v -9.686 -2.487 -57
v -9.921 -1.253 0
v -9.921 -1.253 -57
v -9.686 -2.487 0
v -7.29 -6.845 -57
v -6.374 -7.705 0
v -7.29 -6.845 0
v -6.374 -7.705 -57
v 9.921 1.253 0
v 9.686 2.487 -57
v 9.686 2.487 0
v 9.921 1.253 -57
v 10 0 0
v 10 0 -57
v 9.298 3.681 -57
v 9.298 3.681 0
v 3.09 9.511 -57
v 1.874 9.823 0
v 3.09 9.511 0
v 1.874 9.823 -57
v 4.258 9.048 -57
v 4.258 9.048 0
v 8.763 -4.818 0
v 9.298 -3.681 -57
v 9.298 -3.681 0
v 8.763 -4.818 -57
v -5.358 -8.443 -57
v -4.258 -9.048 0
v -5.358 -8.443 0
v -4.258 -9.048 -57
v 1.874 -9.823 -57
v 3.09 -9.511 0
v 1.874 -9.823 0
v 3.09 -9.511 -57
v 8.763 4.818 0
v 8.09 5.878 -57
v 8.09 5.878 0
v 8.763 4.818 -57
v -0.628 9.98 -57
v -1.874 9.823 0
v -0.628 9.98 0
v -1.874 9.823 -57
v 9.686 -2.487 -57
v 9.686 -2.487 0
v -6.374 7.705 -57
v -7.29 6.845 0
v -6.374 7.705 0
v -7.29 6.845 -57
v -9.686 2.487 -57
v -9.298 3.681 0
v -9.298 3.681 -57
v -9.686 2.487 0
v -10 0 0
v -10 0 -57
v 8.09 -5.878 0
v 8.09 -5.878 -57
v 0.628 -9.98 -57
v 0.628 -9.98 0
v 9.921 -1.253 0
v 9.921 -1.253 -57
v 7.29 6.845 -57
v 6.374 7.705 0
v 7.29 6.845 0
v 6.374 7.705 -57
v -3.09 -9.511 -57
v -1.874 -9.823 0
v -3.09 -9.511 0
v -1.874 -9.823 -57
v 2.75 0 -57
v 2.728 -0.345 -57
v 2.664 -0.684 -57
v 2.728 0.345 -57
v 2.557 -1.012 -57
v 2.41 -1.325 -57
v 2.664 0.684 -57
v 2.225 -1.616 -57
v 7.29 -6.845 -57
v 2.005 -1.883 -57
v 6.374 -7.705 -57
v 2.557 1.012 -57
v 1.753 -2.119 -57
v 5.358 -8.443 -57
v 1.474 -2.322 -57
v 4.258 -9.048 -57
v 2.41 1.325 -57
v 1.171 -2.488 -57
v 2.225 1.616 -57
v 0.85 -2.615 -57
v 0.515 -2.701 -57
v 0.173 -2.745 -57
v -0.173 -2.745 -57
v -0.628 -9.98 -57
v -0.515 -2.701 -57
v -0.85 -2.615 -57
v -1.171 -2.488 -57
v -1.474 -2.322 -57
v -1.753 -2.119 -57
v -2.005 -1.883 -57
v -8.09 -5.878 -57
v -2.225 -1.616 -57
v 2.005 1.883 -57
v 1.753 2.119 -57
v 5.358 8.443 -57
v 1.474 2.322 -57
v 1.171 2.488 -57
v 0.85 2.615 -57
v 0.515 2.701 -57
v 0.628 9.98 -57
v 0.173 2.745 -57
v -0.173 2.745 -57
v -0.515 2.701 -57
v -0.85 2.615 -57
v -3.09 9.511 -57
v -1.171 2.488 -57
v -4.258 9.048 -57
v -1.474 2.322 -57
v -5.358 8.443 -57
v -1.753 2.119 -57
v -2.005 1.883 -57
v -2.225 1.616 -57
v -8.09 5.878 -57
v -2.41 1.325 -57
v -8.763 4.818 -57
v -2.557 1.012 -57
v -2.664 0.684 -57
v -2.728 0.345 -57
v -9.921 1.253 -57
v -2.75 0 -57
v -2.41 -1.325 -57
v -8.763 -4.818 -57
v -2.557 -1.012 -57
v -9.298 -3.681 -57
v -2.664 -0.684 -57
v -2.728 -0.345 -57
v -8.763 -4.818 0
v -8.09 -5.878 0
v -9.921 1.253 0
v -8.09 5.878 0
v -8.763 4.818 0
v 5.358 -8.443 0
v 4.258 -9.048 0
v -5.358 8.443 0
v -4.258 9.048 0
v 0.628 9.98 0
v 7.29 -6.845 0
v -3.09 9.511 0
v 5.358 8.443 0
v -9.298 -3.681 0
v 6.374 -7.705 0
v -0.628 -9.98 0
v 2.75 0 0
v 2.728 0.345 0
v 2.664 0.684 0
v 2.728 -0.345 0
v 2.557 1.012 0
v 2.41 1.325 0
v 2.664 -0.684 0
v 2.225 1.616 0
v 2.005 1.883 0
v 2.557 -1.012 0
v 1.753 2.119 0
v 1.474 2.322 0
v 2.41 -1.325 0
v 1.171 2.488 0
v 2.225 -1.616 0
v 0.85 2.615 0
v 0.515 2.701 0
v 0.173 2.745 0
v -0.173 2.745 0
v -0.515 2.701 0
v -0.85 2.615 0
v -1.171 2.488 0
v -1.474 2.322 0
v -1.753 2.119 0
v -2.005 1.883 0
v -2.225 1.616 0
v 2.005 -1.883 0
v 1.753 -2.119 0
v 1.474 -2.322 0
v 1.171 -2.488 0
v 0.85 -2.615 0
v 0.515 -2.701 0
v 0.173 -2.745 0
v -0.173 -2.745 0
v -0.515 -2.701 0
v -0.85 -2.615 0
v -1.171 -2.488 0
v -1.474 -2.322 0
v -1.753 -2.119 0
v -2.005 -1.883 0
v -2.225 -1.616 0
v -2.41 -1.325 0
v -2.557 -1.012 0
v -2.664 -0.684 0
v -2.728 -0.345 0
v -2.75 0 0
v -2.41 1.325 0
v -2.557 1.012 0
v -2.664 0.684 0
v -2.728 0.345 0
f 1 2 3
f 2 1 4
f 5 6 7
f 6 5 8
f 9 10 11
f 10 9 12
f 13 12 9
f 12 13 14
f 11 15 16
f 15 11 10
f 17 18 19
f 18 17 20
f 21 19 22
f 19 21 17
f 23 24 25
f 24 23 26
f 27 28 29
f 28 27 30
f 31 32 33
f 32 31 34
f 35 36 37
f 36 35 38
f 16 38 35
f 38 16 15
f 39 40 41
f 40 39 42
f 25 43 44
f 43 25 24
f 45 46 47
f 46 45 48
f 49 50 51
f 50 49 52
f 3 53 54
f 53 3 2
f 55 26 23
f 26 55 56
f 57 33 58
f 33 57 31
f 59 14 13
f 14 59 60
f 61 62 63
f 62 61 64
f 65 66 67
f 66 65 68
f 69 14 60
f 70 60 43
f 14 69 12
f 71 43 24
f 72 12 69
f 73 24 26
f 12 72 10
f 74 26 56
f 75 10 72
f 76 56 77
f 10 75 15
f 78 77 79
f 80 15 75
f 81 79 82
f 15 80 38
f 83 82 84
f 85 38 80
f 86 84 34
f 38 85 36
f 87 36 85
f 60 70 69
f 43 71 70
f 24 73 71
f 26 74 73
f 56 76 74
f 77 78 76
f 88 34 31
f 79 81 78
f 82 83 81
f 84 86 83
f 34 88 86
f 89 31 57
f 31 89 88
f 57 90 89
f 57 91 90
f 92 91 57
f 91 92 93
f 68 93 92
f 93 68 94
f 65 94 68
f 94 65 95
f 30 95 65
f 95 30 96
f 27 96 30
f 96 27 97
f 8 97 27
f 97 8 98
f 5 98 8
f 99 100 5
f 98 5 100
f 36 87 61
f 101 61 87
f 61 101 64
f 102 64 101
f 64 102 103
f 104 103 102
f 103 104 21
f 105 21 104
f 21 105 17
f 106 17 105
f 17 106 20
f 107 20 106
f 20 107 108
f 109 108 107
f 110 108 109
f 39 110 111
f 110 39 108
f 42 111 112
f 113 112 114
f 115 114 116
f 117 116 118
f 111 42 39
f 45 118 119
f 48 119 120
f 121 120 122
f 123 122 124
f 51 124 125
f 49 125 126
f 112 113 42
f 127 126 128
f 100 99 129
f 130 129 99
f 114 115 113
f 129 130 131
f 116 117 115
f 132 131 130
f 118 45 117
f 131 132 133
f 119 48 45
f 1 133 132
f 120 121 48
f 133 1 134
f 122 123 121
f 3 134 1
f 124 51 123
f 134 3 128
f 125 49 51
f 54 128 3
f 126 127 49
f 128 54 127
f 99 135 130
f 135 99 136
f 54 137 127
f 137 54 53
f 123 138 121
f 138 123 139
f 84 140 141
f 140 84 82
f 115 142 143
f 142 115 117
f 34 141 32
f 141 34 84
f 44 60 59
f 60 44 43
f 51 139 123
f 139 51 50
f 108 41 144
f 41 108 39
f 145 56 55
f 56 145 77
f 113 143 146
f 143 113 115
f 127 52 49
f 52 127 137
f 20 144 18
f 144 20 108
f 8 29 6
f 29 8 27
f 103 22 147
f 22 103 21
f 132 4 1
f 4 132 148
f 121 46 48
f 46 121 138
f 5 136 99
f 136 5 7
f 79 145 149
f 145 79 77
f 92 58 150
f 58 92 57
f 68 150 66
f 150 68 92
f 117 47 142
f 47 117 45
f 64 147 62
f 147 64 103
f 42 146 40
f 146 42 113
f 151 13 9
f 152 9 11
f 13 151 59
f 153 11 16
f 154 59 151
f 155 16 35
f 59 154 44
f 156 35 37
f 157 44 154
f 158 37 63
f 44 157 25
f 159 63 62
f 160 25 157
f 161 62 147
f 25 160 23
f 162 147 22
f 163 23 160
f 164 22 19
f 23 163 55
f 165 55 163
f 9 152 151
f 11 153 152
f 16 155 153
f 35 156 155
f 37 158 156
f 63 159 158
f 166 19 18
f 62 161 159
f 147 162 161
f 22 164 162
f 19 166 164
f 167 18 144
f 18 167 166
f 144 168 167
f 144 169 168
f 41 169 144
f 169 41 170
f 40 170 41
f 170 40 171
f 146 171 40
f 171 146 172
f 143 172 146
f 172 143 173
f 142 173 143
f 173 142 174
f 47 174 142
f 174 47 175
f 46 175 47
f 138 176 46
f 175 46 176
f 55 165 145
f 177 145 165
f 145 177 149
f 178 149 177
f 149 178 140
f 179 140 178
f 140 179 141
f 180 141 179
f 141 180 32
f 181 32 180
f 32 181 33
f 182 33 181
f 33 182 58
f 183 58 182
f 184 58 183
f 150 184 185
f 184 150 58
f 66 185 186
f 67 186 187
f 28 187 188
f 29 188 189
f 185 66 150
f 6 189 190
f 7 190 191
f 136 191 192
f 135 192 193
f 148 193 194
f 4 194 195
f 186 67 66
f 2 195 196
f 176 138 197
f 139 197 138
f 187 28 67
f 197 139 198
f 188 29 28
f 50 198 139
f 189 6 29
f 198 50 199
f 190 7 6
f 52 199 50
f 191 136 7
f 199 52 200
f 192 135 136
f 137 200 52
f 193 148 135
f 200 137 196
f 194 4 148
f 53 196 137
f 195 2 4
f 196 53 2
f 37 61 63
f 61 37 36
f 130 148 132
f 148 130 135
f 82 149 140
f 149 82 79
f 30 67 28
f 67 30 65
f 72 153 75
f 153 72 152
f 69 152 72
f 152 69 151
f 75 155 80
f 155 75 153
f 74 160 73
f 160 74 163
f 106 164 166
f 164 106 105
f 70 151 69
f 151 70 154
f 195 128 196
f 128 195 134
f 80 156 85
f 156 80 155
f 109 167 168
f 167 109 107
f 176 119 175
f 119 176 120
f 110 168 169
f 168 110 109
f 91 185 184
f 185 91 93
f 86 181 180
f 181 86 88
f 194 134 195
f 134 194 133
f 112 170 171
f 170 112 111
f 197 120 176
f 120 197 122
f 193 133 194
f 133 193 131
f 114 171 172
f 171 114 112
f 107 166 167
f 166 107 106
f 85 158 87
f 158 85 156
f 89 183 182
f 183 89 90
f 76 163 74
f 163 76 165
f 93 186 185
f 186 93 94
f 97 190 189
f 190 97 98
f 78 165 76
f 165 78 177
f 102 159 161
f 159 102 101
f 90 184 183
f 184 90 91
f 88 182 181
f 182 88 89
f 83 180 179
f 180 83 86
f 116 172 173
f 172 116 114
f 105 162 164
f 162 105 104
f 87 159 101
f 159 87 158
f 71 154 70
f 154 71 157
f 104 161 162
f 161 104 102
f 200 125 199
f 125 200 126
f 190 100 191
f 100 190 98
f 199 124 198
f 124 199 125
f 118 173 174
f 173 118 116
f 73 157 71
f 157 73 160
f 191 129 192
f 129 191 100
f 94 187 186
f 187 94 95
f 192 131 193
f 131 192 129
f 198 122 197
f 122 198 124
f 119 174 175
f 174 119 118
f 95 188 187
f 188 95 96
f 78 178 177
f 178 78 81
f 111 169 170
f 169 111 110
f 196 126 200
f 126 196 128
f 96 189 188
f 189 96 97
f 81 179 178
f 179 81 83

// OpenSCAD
$fn = 50;


difference() {
	union() {
		translate(v = [0, 0, -57.0000000000]) {
			cylinder(h = 57, r = 10.0000000000);
		}
	}
	union() {
		#translate(v = [0, 0, -57]) {
			cylinder(h = 57, r = 2.7500000000);
		}
	}
}
